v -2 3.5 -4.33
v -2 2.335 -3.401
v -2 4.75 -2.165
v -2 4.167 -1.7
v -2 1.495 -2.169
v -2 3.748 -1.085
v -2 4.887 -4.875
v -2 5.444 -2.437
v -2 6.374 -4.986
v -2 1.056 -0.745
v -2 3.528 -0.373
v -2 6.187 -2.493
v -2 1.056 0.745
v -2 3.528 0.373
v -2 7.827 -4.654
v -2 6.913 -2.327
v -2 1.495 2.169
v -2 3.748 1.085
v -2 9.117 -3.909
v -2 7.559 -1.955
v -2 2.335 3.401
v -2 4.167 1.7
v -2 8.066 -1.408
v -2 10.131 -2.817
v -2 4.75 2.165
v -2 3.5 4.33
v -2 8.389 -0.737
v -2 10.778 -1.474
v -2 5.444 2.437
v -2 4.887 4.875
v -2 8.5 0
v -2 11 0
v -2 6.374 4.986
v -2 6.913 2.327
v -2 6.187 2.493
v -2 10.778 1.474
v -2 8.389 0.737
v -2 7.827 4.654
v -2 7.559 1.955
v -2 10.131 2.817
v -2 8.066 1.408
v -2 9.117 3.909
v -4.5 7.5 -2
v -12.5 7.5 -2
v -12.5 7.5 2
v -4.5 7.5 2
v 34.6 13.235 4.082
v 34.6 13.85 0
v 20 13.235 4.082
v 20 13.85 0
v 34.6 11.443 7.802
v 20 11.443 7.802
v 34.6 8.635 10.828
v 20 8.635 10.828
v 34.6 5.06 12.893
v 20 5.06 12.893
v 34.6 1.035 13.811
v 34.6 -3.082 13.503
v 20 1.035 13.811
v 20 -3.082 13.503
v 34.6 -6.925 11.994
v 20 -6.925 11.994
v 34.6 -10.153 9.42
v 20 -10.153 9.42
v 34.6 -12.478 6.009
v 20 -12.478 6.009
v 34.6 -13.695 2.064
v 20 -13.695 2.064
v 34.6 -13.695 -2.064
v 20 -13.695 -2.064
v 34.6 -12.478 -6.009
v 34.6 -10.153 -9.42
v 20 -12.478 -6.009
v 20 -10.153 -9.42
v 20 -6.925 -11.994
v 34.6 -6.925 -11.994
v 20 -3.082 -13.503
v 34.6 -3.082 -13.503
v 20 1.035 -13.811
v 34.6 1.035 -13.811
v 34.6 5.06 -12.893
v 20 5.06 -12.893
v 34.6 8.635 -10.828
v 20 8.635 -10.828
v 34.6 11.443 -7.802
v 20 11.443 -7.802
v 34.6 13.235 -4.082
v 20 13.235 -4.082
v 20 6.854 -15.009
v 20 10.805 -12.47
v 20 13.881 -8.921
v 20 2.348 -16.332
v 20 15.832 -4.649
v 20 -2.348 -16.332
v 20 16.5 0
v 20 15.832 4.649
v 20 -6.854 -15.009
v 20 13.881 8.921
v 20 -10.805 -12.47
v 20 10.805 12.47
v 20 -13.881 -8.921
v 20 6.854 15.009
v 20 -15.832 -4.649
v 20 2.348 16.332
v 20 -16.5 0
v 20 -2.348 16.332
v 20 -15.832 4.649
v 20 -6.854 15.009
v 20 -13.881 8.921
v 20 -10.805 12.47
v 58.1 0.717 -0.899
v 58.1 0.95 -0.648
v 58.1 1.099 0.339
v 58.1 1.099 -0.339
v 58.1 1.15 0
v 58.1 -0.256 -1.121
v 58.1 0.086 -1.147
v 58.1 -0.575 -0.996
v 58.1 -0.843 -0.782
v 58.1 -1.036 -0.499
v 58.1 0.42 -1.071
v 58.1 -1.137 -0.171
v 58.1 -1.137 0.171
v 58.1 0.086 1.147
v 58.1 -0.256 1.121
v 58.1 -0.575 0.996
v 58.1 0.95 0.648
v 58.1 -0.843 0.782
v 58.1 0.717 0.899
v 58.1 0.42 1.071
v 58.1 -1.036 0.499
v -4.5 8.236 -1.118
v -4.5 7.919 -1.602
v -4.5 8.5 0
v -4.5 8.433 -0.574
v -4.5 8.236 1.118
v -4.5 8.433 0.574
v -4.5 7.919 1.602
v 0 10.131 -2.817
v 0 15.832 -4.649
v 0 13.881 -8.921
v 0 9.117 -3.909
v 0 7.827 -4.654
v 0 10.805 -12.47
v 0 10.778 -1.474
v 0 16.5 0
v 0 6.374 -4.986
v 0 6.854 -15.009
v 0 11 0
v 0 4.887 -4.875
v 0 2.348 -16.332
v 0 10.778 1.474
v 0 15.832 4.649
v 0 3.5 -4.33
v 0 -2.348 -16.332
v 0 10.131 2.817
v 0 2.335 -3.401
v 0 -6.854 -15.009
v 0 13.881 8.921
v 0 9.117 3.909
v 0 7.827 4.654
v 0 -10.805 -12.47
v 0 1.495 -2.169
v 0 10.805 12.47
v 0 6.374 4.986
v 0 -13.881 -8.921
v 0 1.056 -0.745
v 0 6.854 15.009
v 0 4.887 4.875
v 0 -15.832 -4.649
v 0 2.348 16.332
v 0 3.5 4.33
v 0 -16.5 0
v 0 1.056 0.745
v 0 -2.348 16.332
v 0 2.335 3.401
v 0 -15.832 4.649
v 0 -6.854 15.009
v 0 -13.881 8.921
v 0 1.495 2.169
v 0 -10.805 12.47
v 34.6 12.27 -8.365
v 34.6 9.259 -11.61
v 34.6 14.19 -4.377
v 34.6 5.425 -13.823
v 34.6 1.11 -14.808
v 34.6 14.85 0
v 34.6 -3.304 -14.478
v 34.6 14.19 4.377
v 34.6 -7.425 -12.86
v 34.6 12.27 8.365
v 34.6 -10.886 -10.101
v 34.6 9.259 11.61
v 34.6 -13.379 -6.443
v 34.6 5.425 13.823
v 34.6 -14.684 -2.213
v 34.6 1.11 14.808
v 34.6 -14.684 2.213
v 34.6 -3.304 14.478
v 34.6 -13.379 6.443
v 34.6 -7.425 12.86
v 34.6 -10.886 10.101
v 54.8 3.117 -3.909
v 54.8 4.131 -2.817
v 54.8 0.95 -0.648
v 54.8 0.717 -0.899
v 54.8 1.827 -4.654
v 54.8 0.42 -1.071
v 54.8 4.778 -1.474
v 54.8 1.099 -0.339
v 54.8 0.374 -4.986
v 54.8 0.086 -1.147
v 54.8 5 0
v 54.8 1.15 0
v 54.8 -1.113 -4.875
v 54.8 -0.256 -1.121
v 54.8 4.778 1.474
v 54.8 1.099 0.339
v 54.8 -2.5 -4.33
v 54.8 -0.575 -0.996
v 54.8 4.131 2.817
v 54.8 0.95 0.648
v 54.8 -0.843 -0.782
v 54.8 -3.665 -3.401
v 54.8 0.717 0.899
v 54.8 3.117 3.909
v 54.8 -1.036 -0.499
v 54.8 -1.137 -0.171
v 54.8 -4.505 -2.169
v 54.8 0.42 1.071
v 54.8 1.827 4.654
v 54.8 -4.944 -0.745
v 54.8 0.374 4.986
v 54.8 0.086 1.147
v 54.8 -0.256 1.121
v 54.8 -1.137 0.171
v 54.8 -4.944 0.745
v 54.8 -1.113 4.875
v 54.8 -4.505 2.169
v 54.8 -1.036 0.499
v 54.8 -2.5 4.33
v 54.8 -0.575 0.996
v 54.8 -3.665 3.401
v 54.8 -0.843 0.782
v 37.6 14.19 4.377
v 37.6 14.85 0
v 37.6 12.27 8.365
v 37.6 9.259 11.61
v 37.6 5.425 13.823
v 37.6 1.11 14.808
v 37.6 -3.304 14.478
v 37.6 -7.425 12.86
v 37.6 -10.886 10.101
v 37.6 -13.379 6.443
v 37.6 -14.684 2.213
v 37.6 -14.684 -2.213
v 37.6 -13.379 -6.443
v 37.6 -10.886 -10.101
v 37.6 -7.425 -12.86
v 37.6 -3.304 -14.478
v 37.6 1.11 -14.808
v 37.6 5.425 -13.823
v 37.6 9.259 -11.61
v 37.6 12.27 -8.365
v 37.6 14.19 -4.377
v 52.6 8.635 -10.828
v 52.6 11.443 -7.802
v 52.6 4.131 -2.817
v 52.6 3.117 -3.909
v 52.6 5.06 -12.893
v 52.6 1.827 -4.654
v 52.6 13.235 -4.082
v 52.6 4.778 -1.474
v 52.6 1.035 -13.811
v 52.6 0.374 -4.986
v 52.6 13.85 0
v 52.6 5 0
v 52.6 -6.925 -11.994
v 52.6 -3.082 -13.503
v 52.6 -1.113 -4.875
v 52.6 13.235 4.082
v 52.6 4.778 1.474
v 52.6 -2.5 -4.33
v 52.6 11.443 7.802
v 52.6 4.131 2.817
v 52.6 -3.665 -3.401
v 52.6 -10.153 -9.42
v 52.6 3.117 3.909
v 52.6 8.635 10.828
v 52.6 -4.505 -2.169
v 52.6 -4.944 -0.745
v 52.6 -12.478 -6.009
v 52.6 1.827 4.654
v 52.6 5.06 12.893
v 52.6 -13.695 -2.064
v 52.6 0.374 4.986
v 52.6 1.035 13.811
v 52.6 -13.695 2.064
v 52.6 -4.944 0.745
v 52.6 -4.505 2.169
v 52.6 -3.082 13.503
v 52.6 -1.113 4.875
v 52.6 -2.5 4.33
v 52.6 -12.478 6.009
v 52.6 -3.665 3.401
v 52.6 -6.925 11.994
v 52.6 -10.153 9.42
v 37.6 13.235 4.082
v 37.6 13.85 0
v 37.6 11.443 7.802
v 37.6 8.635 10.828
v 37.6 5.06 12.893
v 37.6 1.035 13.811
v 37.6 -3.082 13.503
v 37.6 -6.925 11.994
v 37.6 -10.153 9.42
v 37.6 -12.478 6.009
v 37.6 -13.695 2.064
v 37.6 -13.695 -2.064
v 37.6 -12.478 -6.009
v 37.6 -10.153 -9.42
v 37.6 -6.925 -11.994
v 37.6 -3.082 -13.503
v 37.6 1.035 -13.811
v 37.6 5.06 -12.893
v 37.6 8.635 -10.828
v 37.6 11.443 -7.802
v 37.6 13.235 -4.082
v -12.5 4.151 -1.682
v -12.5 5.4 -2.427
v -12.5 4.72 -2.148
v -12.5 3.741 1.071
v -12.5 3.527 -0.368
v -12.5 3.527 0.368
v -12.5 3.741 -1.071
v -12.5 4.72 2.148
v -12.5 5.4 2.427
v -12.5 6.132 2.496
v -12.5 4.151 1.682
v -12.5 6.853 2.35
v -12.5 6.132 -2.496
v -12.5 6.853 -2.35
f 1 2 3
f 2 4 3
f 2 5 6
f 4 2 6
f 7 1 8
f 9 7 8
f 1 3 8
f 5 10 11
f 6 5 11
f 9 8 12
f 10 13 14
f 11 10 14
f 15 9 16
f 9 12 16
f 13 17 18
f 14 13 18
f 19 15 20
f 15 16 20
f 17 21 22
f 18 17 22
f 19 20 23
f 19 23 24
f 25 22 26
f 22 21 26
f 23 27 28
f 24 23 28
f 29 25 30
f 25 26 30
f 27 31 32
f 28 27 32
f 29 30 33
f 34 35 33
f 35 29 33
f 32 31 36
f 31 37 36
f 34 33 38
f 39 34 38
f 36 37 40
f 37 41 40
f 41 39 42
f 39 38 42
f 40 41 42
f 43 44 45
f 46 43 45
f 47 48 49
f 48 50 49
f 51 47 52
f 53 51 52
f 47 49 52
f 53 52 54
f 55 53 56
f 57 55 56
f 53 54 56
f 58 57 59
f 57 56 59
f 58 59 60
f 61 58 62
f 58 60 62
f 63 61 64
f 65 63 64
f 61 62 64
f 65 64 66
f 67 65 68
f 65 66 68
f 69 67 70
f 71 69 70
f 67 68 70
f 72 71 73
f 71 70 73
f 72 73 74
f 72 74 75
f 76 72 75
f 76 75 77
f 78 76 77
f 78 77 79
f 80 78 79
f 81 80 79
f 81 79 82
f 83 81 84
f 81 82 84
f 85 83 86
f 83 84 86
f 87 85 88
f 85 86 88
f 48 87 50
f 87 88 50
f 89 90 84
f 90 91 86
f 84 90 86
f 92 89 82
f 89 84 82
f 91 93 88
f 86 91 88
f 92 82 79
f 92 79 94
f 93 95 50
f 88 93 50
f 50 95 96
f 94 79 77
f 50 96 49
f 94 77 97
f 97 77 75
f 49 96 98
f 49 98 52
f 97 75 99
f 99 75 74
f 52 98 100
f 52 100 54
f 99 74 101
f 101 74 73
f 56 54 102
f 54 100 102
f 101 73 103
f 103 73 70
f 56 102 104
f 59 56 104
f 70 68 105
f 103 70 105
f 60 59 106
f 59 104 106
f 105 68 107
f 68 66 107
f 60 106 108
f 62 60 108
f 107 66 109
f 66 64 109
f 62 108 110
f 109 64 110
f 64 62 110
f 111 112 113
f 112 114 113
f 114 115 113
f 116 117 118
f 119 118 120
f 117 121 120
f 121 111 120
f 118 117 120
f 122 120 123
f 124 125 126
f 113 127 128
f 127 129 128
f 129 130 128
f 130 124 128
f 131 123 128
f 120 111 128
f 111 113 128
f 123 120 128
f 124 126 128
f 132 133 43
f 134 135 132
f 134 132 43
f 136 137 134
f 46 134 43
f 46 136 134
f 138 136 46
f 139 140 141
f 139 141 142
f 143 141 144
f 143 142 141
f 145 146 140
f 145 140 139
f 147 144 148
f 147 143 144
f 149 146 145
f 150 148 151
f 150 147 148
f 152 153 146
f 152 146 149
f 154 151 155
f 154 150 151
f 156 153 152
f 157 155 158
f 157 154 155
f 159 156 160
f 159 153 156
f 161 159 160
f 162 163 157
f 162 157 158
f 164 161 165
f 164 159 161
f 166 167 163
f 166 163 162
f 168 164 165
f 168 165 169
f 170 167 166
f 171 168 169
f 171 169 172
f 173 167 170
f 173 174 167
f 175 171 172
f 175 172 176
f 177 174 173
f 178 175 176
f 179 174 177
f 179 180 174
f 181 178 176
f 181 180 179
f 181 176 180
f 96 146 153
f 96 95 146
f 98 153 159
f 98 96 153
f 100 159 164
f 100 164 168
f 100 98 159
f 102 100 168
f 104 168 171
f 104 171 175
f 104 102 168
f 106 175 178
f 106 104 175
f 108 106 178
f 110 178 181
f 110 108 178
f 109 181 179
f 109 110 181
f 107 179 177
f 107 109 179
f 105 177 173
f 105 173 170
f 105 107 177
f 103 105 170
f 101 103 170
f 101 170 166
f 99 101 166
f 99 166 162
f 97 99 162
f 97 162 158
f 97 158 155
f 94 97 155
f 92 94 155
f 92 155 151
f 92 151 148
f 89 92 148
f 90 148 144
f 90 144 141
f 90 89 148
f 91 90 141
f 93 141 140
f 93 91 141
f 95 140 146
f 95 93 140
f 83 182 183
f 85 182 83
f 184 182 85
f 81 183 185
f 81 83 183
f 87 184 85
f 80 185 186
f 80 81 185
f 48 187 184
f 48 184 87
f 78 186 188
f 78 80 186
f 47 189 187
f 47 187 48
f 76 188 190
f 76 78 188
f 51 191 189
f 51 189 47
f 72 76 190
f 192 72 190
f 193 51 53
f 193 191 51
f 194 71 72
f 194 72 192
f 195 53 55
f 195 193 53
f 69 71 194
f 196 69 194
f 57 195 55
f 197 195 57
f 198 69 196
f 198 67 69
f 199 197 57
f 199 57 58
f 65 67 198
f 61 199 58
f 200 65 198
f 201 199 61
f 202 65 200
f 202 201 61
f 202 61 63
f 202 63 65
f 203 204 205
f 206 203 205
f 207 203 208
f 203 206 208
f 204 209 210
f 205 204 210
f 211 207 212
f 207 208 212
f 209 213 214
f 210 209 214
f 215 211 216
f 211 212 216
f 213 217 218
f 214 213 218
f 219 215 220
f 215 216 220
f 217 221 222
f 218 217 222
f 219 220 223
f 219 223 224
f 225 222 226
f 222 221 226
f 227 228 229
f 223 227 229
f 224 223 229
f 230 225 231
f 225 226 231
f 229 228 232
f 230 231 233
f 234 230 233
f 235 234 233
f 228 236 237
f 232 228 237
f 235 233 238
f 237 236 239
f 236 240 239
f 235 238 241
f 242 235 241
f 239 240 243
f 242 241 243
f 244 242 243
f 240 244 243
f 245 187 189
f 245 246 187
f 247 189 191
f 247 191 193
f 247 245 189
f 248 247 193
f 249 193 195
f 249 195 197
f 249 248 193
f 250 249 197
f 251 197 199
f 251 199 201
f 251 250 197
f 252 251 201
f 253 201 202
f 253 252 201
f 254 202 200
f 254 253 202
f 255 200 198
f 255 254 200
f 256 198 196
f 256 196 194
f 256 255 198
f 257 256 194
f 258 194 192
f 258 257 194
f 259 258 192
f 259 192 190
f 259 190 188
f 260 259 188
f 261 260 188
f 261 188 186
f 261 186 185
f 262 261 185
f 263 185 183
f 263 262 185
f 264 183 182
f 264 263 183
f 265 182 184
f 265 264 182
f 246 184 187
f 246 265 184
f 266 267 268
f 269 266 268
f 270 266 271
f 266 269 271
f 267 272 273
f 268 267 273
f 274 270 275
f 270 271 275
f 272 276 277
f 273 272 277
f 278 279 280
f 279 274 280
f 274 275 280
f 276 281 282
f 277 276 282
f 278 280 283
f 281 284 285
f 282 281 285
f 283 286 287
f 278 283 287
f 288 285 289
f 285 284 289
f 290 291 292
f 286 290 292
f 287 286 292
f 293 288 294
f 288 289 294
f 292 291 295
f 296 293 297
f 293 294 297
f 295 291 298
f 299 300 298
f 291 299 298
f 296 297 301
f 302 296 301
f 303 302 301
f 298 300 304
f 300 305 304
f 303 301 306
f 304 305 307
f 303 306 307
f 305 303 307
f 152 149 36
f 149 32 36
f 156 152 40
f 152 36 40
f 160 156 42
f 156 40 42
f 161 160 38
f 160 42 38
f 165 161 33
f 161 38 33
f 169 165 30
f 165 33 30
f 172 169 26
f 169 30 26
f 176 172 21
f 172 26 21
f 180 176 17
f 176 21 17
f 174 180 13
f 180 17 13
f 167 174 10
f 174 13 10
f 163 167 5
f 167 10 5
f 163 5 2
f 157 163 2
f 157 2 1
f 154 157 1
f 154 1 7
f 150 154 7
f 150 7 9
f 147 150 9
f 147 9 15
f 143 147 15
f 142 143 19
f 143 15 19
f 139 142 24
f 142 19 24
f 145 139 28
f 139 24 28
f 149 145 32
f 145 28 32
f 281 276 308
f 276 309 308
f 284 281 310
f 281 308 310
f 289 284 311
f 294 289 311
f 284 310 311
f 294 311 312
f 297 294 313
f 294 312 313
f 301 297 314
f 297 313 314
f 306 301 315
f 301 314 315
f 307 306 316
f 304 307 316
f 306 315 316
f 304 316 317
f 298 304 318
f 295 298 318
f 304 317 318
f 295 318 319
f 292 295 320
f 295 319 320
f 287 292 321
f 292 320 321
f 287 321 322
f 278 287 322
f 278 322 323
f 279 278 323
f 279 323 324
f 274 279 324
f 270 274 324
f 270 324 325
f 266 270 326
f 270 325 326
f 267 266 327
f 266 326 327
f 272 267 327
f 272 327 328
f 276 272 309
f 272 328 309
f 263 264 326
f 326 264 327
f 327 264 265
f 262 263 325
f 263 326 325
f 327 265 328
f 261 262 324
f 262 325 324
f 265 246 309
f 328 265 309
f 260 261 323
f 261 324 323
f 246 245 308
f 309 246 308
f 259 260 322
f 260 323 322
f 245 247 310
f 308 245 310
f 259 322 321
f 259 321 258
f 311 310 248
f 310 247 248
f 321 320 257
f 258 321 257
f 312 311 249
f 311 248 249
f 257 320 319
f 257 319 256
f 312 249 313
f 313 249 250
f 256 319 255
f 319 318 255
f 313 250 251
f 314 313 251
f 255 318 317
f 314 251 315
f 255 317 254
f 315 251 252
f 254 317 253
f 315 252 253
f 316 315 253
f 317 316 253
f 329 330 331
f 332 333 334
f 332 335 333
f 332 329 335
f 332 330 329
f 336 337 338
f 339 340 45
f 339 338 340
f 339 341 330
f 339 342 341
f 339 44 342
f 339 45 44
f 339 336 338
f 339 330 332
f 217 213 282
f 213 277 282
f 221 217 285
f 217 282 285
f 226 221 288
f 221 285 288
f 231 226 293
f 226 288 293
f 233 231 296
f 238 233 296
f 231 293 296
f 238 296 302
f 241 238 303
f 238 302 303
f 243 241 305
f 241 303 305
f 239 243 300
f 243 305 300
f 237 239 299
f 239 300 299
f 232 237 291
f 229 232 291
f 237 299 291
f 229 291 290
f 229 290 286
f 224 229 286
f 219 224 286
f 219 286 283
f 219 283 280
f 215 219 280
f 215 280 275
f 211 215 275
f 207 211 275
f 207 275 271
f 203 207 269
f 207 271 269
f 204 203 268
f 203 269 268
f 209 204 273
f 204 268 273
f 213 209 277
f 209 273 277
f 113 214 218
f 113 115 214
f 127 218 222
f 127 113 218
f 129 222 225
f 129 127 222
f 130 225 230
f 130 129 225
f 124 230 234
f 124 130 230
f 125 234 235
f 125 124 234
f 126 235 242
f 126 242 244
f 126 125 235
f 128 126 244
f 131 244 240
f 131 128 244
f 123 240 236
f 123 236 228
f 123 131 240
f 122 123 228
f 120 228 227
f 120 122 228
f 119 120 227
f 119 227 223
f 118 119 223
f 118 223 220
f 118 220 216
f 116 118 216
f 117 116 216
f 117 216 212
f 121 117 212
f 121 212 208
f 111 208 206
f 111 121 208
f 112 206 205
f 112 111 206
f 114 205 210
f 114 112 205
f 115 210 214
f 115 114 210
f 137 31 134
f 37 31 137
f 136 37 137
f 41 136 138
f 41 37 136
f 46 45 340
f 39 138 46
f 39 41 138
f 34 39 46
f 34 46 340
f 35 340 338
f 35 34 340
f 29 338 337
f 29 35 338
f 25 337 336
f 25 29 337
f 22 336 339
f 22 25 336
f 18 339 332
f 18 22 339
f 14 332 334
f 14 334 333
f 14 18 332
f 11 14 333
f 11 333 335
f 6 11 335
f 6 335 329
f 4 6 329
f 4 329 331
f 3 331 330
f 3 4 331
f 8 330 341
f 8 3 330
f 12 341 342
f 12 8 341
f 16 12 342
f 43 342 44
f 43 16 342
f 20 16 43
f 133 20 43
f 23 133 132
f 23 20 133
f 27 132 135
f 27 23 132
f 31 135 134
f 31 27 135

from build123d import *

# Parameters (mm, degrees)
SKETCH1_W          = 20
SKETCH1_H          = 16.5
SKETCH1_W_2        = 14.6
SKETCH1_H_2        = 13.85
SKETCH1_W_3        = 3
SKETCH1_H_3        = 1
SKETCH1_W_4        = 3.3
SKETCH1_H_4        = 1.15
SKETCH3_W          = 10.5
SKETCH3_H          = 2.5
CUT_EXTRUDE1_DEPTH = 8


with BuildPart() as part:
    # Sketch1 → Revolve1 (revolve)
    with BuildSketch(Plane.XY):
        with Locations((10, 8.25)):
            Rectangle(SKETCH1_W, SKETCH1_H)
        with Locations((27.3, 6.925)):
            Rectangle(SKETCH1_W_2, SKETCH1_H_2)
        with Locations((36.1, 6.925)):
            Rectangle(SKETCH1_W_3, SKETCH1_H_2)
        with Locations((36.1, 14.35)):
            Rectangle(SKETCH1_W_3, SKETCH1_H_3)
        Polygon((37.6, 13.85), (37.6, 0), (52.6, 0), (52.6, 5), (52.6, 13.85), align=None)
        Polygon((52.6, 5), (52.6, 0), (54.8, 0), (54.8, 1.15), (54.8, 5), align=None)
        with Locations((56.45, 0.575)):
            Rectangle(SKETCH1_W_4, SKETCH1_H_4)
    revolve(axis=Axis((0, 0, 0), (1, 0, 0)))

    # Sketch3 → Revolve2 (revolve)
    with BuildSketch(Plane.XY):
        with Locations((-7.25, 7.25)):
            Rectangle(SKETCH3_W, SKETCH3_H)
        Polygon((-2, 8.5), (-2, 6), (0, 6), (0, 11), (-2, 11), align=None)
    revolve(axis=Axis((-12.5, 6, 0), (1, 0, 0)))

    # Sketch4 → Cut-Extrude1 (cut)
    with BuildSketch(Plane.ZY.offset(12.5)):
        Polygon((-72.605280298, 7.5), (-2, 7.5), (2, 7.5), (72.605280298, 7.5), (72.605280298, 148.710560596), (-72.605280298, 148.710560596), align=None)
    extrude(amount=-CUT_EXTRUDE1_DEPTH, mode=Mode.SUBTRACT)


solid = part.part
